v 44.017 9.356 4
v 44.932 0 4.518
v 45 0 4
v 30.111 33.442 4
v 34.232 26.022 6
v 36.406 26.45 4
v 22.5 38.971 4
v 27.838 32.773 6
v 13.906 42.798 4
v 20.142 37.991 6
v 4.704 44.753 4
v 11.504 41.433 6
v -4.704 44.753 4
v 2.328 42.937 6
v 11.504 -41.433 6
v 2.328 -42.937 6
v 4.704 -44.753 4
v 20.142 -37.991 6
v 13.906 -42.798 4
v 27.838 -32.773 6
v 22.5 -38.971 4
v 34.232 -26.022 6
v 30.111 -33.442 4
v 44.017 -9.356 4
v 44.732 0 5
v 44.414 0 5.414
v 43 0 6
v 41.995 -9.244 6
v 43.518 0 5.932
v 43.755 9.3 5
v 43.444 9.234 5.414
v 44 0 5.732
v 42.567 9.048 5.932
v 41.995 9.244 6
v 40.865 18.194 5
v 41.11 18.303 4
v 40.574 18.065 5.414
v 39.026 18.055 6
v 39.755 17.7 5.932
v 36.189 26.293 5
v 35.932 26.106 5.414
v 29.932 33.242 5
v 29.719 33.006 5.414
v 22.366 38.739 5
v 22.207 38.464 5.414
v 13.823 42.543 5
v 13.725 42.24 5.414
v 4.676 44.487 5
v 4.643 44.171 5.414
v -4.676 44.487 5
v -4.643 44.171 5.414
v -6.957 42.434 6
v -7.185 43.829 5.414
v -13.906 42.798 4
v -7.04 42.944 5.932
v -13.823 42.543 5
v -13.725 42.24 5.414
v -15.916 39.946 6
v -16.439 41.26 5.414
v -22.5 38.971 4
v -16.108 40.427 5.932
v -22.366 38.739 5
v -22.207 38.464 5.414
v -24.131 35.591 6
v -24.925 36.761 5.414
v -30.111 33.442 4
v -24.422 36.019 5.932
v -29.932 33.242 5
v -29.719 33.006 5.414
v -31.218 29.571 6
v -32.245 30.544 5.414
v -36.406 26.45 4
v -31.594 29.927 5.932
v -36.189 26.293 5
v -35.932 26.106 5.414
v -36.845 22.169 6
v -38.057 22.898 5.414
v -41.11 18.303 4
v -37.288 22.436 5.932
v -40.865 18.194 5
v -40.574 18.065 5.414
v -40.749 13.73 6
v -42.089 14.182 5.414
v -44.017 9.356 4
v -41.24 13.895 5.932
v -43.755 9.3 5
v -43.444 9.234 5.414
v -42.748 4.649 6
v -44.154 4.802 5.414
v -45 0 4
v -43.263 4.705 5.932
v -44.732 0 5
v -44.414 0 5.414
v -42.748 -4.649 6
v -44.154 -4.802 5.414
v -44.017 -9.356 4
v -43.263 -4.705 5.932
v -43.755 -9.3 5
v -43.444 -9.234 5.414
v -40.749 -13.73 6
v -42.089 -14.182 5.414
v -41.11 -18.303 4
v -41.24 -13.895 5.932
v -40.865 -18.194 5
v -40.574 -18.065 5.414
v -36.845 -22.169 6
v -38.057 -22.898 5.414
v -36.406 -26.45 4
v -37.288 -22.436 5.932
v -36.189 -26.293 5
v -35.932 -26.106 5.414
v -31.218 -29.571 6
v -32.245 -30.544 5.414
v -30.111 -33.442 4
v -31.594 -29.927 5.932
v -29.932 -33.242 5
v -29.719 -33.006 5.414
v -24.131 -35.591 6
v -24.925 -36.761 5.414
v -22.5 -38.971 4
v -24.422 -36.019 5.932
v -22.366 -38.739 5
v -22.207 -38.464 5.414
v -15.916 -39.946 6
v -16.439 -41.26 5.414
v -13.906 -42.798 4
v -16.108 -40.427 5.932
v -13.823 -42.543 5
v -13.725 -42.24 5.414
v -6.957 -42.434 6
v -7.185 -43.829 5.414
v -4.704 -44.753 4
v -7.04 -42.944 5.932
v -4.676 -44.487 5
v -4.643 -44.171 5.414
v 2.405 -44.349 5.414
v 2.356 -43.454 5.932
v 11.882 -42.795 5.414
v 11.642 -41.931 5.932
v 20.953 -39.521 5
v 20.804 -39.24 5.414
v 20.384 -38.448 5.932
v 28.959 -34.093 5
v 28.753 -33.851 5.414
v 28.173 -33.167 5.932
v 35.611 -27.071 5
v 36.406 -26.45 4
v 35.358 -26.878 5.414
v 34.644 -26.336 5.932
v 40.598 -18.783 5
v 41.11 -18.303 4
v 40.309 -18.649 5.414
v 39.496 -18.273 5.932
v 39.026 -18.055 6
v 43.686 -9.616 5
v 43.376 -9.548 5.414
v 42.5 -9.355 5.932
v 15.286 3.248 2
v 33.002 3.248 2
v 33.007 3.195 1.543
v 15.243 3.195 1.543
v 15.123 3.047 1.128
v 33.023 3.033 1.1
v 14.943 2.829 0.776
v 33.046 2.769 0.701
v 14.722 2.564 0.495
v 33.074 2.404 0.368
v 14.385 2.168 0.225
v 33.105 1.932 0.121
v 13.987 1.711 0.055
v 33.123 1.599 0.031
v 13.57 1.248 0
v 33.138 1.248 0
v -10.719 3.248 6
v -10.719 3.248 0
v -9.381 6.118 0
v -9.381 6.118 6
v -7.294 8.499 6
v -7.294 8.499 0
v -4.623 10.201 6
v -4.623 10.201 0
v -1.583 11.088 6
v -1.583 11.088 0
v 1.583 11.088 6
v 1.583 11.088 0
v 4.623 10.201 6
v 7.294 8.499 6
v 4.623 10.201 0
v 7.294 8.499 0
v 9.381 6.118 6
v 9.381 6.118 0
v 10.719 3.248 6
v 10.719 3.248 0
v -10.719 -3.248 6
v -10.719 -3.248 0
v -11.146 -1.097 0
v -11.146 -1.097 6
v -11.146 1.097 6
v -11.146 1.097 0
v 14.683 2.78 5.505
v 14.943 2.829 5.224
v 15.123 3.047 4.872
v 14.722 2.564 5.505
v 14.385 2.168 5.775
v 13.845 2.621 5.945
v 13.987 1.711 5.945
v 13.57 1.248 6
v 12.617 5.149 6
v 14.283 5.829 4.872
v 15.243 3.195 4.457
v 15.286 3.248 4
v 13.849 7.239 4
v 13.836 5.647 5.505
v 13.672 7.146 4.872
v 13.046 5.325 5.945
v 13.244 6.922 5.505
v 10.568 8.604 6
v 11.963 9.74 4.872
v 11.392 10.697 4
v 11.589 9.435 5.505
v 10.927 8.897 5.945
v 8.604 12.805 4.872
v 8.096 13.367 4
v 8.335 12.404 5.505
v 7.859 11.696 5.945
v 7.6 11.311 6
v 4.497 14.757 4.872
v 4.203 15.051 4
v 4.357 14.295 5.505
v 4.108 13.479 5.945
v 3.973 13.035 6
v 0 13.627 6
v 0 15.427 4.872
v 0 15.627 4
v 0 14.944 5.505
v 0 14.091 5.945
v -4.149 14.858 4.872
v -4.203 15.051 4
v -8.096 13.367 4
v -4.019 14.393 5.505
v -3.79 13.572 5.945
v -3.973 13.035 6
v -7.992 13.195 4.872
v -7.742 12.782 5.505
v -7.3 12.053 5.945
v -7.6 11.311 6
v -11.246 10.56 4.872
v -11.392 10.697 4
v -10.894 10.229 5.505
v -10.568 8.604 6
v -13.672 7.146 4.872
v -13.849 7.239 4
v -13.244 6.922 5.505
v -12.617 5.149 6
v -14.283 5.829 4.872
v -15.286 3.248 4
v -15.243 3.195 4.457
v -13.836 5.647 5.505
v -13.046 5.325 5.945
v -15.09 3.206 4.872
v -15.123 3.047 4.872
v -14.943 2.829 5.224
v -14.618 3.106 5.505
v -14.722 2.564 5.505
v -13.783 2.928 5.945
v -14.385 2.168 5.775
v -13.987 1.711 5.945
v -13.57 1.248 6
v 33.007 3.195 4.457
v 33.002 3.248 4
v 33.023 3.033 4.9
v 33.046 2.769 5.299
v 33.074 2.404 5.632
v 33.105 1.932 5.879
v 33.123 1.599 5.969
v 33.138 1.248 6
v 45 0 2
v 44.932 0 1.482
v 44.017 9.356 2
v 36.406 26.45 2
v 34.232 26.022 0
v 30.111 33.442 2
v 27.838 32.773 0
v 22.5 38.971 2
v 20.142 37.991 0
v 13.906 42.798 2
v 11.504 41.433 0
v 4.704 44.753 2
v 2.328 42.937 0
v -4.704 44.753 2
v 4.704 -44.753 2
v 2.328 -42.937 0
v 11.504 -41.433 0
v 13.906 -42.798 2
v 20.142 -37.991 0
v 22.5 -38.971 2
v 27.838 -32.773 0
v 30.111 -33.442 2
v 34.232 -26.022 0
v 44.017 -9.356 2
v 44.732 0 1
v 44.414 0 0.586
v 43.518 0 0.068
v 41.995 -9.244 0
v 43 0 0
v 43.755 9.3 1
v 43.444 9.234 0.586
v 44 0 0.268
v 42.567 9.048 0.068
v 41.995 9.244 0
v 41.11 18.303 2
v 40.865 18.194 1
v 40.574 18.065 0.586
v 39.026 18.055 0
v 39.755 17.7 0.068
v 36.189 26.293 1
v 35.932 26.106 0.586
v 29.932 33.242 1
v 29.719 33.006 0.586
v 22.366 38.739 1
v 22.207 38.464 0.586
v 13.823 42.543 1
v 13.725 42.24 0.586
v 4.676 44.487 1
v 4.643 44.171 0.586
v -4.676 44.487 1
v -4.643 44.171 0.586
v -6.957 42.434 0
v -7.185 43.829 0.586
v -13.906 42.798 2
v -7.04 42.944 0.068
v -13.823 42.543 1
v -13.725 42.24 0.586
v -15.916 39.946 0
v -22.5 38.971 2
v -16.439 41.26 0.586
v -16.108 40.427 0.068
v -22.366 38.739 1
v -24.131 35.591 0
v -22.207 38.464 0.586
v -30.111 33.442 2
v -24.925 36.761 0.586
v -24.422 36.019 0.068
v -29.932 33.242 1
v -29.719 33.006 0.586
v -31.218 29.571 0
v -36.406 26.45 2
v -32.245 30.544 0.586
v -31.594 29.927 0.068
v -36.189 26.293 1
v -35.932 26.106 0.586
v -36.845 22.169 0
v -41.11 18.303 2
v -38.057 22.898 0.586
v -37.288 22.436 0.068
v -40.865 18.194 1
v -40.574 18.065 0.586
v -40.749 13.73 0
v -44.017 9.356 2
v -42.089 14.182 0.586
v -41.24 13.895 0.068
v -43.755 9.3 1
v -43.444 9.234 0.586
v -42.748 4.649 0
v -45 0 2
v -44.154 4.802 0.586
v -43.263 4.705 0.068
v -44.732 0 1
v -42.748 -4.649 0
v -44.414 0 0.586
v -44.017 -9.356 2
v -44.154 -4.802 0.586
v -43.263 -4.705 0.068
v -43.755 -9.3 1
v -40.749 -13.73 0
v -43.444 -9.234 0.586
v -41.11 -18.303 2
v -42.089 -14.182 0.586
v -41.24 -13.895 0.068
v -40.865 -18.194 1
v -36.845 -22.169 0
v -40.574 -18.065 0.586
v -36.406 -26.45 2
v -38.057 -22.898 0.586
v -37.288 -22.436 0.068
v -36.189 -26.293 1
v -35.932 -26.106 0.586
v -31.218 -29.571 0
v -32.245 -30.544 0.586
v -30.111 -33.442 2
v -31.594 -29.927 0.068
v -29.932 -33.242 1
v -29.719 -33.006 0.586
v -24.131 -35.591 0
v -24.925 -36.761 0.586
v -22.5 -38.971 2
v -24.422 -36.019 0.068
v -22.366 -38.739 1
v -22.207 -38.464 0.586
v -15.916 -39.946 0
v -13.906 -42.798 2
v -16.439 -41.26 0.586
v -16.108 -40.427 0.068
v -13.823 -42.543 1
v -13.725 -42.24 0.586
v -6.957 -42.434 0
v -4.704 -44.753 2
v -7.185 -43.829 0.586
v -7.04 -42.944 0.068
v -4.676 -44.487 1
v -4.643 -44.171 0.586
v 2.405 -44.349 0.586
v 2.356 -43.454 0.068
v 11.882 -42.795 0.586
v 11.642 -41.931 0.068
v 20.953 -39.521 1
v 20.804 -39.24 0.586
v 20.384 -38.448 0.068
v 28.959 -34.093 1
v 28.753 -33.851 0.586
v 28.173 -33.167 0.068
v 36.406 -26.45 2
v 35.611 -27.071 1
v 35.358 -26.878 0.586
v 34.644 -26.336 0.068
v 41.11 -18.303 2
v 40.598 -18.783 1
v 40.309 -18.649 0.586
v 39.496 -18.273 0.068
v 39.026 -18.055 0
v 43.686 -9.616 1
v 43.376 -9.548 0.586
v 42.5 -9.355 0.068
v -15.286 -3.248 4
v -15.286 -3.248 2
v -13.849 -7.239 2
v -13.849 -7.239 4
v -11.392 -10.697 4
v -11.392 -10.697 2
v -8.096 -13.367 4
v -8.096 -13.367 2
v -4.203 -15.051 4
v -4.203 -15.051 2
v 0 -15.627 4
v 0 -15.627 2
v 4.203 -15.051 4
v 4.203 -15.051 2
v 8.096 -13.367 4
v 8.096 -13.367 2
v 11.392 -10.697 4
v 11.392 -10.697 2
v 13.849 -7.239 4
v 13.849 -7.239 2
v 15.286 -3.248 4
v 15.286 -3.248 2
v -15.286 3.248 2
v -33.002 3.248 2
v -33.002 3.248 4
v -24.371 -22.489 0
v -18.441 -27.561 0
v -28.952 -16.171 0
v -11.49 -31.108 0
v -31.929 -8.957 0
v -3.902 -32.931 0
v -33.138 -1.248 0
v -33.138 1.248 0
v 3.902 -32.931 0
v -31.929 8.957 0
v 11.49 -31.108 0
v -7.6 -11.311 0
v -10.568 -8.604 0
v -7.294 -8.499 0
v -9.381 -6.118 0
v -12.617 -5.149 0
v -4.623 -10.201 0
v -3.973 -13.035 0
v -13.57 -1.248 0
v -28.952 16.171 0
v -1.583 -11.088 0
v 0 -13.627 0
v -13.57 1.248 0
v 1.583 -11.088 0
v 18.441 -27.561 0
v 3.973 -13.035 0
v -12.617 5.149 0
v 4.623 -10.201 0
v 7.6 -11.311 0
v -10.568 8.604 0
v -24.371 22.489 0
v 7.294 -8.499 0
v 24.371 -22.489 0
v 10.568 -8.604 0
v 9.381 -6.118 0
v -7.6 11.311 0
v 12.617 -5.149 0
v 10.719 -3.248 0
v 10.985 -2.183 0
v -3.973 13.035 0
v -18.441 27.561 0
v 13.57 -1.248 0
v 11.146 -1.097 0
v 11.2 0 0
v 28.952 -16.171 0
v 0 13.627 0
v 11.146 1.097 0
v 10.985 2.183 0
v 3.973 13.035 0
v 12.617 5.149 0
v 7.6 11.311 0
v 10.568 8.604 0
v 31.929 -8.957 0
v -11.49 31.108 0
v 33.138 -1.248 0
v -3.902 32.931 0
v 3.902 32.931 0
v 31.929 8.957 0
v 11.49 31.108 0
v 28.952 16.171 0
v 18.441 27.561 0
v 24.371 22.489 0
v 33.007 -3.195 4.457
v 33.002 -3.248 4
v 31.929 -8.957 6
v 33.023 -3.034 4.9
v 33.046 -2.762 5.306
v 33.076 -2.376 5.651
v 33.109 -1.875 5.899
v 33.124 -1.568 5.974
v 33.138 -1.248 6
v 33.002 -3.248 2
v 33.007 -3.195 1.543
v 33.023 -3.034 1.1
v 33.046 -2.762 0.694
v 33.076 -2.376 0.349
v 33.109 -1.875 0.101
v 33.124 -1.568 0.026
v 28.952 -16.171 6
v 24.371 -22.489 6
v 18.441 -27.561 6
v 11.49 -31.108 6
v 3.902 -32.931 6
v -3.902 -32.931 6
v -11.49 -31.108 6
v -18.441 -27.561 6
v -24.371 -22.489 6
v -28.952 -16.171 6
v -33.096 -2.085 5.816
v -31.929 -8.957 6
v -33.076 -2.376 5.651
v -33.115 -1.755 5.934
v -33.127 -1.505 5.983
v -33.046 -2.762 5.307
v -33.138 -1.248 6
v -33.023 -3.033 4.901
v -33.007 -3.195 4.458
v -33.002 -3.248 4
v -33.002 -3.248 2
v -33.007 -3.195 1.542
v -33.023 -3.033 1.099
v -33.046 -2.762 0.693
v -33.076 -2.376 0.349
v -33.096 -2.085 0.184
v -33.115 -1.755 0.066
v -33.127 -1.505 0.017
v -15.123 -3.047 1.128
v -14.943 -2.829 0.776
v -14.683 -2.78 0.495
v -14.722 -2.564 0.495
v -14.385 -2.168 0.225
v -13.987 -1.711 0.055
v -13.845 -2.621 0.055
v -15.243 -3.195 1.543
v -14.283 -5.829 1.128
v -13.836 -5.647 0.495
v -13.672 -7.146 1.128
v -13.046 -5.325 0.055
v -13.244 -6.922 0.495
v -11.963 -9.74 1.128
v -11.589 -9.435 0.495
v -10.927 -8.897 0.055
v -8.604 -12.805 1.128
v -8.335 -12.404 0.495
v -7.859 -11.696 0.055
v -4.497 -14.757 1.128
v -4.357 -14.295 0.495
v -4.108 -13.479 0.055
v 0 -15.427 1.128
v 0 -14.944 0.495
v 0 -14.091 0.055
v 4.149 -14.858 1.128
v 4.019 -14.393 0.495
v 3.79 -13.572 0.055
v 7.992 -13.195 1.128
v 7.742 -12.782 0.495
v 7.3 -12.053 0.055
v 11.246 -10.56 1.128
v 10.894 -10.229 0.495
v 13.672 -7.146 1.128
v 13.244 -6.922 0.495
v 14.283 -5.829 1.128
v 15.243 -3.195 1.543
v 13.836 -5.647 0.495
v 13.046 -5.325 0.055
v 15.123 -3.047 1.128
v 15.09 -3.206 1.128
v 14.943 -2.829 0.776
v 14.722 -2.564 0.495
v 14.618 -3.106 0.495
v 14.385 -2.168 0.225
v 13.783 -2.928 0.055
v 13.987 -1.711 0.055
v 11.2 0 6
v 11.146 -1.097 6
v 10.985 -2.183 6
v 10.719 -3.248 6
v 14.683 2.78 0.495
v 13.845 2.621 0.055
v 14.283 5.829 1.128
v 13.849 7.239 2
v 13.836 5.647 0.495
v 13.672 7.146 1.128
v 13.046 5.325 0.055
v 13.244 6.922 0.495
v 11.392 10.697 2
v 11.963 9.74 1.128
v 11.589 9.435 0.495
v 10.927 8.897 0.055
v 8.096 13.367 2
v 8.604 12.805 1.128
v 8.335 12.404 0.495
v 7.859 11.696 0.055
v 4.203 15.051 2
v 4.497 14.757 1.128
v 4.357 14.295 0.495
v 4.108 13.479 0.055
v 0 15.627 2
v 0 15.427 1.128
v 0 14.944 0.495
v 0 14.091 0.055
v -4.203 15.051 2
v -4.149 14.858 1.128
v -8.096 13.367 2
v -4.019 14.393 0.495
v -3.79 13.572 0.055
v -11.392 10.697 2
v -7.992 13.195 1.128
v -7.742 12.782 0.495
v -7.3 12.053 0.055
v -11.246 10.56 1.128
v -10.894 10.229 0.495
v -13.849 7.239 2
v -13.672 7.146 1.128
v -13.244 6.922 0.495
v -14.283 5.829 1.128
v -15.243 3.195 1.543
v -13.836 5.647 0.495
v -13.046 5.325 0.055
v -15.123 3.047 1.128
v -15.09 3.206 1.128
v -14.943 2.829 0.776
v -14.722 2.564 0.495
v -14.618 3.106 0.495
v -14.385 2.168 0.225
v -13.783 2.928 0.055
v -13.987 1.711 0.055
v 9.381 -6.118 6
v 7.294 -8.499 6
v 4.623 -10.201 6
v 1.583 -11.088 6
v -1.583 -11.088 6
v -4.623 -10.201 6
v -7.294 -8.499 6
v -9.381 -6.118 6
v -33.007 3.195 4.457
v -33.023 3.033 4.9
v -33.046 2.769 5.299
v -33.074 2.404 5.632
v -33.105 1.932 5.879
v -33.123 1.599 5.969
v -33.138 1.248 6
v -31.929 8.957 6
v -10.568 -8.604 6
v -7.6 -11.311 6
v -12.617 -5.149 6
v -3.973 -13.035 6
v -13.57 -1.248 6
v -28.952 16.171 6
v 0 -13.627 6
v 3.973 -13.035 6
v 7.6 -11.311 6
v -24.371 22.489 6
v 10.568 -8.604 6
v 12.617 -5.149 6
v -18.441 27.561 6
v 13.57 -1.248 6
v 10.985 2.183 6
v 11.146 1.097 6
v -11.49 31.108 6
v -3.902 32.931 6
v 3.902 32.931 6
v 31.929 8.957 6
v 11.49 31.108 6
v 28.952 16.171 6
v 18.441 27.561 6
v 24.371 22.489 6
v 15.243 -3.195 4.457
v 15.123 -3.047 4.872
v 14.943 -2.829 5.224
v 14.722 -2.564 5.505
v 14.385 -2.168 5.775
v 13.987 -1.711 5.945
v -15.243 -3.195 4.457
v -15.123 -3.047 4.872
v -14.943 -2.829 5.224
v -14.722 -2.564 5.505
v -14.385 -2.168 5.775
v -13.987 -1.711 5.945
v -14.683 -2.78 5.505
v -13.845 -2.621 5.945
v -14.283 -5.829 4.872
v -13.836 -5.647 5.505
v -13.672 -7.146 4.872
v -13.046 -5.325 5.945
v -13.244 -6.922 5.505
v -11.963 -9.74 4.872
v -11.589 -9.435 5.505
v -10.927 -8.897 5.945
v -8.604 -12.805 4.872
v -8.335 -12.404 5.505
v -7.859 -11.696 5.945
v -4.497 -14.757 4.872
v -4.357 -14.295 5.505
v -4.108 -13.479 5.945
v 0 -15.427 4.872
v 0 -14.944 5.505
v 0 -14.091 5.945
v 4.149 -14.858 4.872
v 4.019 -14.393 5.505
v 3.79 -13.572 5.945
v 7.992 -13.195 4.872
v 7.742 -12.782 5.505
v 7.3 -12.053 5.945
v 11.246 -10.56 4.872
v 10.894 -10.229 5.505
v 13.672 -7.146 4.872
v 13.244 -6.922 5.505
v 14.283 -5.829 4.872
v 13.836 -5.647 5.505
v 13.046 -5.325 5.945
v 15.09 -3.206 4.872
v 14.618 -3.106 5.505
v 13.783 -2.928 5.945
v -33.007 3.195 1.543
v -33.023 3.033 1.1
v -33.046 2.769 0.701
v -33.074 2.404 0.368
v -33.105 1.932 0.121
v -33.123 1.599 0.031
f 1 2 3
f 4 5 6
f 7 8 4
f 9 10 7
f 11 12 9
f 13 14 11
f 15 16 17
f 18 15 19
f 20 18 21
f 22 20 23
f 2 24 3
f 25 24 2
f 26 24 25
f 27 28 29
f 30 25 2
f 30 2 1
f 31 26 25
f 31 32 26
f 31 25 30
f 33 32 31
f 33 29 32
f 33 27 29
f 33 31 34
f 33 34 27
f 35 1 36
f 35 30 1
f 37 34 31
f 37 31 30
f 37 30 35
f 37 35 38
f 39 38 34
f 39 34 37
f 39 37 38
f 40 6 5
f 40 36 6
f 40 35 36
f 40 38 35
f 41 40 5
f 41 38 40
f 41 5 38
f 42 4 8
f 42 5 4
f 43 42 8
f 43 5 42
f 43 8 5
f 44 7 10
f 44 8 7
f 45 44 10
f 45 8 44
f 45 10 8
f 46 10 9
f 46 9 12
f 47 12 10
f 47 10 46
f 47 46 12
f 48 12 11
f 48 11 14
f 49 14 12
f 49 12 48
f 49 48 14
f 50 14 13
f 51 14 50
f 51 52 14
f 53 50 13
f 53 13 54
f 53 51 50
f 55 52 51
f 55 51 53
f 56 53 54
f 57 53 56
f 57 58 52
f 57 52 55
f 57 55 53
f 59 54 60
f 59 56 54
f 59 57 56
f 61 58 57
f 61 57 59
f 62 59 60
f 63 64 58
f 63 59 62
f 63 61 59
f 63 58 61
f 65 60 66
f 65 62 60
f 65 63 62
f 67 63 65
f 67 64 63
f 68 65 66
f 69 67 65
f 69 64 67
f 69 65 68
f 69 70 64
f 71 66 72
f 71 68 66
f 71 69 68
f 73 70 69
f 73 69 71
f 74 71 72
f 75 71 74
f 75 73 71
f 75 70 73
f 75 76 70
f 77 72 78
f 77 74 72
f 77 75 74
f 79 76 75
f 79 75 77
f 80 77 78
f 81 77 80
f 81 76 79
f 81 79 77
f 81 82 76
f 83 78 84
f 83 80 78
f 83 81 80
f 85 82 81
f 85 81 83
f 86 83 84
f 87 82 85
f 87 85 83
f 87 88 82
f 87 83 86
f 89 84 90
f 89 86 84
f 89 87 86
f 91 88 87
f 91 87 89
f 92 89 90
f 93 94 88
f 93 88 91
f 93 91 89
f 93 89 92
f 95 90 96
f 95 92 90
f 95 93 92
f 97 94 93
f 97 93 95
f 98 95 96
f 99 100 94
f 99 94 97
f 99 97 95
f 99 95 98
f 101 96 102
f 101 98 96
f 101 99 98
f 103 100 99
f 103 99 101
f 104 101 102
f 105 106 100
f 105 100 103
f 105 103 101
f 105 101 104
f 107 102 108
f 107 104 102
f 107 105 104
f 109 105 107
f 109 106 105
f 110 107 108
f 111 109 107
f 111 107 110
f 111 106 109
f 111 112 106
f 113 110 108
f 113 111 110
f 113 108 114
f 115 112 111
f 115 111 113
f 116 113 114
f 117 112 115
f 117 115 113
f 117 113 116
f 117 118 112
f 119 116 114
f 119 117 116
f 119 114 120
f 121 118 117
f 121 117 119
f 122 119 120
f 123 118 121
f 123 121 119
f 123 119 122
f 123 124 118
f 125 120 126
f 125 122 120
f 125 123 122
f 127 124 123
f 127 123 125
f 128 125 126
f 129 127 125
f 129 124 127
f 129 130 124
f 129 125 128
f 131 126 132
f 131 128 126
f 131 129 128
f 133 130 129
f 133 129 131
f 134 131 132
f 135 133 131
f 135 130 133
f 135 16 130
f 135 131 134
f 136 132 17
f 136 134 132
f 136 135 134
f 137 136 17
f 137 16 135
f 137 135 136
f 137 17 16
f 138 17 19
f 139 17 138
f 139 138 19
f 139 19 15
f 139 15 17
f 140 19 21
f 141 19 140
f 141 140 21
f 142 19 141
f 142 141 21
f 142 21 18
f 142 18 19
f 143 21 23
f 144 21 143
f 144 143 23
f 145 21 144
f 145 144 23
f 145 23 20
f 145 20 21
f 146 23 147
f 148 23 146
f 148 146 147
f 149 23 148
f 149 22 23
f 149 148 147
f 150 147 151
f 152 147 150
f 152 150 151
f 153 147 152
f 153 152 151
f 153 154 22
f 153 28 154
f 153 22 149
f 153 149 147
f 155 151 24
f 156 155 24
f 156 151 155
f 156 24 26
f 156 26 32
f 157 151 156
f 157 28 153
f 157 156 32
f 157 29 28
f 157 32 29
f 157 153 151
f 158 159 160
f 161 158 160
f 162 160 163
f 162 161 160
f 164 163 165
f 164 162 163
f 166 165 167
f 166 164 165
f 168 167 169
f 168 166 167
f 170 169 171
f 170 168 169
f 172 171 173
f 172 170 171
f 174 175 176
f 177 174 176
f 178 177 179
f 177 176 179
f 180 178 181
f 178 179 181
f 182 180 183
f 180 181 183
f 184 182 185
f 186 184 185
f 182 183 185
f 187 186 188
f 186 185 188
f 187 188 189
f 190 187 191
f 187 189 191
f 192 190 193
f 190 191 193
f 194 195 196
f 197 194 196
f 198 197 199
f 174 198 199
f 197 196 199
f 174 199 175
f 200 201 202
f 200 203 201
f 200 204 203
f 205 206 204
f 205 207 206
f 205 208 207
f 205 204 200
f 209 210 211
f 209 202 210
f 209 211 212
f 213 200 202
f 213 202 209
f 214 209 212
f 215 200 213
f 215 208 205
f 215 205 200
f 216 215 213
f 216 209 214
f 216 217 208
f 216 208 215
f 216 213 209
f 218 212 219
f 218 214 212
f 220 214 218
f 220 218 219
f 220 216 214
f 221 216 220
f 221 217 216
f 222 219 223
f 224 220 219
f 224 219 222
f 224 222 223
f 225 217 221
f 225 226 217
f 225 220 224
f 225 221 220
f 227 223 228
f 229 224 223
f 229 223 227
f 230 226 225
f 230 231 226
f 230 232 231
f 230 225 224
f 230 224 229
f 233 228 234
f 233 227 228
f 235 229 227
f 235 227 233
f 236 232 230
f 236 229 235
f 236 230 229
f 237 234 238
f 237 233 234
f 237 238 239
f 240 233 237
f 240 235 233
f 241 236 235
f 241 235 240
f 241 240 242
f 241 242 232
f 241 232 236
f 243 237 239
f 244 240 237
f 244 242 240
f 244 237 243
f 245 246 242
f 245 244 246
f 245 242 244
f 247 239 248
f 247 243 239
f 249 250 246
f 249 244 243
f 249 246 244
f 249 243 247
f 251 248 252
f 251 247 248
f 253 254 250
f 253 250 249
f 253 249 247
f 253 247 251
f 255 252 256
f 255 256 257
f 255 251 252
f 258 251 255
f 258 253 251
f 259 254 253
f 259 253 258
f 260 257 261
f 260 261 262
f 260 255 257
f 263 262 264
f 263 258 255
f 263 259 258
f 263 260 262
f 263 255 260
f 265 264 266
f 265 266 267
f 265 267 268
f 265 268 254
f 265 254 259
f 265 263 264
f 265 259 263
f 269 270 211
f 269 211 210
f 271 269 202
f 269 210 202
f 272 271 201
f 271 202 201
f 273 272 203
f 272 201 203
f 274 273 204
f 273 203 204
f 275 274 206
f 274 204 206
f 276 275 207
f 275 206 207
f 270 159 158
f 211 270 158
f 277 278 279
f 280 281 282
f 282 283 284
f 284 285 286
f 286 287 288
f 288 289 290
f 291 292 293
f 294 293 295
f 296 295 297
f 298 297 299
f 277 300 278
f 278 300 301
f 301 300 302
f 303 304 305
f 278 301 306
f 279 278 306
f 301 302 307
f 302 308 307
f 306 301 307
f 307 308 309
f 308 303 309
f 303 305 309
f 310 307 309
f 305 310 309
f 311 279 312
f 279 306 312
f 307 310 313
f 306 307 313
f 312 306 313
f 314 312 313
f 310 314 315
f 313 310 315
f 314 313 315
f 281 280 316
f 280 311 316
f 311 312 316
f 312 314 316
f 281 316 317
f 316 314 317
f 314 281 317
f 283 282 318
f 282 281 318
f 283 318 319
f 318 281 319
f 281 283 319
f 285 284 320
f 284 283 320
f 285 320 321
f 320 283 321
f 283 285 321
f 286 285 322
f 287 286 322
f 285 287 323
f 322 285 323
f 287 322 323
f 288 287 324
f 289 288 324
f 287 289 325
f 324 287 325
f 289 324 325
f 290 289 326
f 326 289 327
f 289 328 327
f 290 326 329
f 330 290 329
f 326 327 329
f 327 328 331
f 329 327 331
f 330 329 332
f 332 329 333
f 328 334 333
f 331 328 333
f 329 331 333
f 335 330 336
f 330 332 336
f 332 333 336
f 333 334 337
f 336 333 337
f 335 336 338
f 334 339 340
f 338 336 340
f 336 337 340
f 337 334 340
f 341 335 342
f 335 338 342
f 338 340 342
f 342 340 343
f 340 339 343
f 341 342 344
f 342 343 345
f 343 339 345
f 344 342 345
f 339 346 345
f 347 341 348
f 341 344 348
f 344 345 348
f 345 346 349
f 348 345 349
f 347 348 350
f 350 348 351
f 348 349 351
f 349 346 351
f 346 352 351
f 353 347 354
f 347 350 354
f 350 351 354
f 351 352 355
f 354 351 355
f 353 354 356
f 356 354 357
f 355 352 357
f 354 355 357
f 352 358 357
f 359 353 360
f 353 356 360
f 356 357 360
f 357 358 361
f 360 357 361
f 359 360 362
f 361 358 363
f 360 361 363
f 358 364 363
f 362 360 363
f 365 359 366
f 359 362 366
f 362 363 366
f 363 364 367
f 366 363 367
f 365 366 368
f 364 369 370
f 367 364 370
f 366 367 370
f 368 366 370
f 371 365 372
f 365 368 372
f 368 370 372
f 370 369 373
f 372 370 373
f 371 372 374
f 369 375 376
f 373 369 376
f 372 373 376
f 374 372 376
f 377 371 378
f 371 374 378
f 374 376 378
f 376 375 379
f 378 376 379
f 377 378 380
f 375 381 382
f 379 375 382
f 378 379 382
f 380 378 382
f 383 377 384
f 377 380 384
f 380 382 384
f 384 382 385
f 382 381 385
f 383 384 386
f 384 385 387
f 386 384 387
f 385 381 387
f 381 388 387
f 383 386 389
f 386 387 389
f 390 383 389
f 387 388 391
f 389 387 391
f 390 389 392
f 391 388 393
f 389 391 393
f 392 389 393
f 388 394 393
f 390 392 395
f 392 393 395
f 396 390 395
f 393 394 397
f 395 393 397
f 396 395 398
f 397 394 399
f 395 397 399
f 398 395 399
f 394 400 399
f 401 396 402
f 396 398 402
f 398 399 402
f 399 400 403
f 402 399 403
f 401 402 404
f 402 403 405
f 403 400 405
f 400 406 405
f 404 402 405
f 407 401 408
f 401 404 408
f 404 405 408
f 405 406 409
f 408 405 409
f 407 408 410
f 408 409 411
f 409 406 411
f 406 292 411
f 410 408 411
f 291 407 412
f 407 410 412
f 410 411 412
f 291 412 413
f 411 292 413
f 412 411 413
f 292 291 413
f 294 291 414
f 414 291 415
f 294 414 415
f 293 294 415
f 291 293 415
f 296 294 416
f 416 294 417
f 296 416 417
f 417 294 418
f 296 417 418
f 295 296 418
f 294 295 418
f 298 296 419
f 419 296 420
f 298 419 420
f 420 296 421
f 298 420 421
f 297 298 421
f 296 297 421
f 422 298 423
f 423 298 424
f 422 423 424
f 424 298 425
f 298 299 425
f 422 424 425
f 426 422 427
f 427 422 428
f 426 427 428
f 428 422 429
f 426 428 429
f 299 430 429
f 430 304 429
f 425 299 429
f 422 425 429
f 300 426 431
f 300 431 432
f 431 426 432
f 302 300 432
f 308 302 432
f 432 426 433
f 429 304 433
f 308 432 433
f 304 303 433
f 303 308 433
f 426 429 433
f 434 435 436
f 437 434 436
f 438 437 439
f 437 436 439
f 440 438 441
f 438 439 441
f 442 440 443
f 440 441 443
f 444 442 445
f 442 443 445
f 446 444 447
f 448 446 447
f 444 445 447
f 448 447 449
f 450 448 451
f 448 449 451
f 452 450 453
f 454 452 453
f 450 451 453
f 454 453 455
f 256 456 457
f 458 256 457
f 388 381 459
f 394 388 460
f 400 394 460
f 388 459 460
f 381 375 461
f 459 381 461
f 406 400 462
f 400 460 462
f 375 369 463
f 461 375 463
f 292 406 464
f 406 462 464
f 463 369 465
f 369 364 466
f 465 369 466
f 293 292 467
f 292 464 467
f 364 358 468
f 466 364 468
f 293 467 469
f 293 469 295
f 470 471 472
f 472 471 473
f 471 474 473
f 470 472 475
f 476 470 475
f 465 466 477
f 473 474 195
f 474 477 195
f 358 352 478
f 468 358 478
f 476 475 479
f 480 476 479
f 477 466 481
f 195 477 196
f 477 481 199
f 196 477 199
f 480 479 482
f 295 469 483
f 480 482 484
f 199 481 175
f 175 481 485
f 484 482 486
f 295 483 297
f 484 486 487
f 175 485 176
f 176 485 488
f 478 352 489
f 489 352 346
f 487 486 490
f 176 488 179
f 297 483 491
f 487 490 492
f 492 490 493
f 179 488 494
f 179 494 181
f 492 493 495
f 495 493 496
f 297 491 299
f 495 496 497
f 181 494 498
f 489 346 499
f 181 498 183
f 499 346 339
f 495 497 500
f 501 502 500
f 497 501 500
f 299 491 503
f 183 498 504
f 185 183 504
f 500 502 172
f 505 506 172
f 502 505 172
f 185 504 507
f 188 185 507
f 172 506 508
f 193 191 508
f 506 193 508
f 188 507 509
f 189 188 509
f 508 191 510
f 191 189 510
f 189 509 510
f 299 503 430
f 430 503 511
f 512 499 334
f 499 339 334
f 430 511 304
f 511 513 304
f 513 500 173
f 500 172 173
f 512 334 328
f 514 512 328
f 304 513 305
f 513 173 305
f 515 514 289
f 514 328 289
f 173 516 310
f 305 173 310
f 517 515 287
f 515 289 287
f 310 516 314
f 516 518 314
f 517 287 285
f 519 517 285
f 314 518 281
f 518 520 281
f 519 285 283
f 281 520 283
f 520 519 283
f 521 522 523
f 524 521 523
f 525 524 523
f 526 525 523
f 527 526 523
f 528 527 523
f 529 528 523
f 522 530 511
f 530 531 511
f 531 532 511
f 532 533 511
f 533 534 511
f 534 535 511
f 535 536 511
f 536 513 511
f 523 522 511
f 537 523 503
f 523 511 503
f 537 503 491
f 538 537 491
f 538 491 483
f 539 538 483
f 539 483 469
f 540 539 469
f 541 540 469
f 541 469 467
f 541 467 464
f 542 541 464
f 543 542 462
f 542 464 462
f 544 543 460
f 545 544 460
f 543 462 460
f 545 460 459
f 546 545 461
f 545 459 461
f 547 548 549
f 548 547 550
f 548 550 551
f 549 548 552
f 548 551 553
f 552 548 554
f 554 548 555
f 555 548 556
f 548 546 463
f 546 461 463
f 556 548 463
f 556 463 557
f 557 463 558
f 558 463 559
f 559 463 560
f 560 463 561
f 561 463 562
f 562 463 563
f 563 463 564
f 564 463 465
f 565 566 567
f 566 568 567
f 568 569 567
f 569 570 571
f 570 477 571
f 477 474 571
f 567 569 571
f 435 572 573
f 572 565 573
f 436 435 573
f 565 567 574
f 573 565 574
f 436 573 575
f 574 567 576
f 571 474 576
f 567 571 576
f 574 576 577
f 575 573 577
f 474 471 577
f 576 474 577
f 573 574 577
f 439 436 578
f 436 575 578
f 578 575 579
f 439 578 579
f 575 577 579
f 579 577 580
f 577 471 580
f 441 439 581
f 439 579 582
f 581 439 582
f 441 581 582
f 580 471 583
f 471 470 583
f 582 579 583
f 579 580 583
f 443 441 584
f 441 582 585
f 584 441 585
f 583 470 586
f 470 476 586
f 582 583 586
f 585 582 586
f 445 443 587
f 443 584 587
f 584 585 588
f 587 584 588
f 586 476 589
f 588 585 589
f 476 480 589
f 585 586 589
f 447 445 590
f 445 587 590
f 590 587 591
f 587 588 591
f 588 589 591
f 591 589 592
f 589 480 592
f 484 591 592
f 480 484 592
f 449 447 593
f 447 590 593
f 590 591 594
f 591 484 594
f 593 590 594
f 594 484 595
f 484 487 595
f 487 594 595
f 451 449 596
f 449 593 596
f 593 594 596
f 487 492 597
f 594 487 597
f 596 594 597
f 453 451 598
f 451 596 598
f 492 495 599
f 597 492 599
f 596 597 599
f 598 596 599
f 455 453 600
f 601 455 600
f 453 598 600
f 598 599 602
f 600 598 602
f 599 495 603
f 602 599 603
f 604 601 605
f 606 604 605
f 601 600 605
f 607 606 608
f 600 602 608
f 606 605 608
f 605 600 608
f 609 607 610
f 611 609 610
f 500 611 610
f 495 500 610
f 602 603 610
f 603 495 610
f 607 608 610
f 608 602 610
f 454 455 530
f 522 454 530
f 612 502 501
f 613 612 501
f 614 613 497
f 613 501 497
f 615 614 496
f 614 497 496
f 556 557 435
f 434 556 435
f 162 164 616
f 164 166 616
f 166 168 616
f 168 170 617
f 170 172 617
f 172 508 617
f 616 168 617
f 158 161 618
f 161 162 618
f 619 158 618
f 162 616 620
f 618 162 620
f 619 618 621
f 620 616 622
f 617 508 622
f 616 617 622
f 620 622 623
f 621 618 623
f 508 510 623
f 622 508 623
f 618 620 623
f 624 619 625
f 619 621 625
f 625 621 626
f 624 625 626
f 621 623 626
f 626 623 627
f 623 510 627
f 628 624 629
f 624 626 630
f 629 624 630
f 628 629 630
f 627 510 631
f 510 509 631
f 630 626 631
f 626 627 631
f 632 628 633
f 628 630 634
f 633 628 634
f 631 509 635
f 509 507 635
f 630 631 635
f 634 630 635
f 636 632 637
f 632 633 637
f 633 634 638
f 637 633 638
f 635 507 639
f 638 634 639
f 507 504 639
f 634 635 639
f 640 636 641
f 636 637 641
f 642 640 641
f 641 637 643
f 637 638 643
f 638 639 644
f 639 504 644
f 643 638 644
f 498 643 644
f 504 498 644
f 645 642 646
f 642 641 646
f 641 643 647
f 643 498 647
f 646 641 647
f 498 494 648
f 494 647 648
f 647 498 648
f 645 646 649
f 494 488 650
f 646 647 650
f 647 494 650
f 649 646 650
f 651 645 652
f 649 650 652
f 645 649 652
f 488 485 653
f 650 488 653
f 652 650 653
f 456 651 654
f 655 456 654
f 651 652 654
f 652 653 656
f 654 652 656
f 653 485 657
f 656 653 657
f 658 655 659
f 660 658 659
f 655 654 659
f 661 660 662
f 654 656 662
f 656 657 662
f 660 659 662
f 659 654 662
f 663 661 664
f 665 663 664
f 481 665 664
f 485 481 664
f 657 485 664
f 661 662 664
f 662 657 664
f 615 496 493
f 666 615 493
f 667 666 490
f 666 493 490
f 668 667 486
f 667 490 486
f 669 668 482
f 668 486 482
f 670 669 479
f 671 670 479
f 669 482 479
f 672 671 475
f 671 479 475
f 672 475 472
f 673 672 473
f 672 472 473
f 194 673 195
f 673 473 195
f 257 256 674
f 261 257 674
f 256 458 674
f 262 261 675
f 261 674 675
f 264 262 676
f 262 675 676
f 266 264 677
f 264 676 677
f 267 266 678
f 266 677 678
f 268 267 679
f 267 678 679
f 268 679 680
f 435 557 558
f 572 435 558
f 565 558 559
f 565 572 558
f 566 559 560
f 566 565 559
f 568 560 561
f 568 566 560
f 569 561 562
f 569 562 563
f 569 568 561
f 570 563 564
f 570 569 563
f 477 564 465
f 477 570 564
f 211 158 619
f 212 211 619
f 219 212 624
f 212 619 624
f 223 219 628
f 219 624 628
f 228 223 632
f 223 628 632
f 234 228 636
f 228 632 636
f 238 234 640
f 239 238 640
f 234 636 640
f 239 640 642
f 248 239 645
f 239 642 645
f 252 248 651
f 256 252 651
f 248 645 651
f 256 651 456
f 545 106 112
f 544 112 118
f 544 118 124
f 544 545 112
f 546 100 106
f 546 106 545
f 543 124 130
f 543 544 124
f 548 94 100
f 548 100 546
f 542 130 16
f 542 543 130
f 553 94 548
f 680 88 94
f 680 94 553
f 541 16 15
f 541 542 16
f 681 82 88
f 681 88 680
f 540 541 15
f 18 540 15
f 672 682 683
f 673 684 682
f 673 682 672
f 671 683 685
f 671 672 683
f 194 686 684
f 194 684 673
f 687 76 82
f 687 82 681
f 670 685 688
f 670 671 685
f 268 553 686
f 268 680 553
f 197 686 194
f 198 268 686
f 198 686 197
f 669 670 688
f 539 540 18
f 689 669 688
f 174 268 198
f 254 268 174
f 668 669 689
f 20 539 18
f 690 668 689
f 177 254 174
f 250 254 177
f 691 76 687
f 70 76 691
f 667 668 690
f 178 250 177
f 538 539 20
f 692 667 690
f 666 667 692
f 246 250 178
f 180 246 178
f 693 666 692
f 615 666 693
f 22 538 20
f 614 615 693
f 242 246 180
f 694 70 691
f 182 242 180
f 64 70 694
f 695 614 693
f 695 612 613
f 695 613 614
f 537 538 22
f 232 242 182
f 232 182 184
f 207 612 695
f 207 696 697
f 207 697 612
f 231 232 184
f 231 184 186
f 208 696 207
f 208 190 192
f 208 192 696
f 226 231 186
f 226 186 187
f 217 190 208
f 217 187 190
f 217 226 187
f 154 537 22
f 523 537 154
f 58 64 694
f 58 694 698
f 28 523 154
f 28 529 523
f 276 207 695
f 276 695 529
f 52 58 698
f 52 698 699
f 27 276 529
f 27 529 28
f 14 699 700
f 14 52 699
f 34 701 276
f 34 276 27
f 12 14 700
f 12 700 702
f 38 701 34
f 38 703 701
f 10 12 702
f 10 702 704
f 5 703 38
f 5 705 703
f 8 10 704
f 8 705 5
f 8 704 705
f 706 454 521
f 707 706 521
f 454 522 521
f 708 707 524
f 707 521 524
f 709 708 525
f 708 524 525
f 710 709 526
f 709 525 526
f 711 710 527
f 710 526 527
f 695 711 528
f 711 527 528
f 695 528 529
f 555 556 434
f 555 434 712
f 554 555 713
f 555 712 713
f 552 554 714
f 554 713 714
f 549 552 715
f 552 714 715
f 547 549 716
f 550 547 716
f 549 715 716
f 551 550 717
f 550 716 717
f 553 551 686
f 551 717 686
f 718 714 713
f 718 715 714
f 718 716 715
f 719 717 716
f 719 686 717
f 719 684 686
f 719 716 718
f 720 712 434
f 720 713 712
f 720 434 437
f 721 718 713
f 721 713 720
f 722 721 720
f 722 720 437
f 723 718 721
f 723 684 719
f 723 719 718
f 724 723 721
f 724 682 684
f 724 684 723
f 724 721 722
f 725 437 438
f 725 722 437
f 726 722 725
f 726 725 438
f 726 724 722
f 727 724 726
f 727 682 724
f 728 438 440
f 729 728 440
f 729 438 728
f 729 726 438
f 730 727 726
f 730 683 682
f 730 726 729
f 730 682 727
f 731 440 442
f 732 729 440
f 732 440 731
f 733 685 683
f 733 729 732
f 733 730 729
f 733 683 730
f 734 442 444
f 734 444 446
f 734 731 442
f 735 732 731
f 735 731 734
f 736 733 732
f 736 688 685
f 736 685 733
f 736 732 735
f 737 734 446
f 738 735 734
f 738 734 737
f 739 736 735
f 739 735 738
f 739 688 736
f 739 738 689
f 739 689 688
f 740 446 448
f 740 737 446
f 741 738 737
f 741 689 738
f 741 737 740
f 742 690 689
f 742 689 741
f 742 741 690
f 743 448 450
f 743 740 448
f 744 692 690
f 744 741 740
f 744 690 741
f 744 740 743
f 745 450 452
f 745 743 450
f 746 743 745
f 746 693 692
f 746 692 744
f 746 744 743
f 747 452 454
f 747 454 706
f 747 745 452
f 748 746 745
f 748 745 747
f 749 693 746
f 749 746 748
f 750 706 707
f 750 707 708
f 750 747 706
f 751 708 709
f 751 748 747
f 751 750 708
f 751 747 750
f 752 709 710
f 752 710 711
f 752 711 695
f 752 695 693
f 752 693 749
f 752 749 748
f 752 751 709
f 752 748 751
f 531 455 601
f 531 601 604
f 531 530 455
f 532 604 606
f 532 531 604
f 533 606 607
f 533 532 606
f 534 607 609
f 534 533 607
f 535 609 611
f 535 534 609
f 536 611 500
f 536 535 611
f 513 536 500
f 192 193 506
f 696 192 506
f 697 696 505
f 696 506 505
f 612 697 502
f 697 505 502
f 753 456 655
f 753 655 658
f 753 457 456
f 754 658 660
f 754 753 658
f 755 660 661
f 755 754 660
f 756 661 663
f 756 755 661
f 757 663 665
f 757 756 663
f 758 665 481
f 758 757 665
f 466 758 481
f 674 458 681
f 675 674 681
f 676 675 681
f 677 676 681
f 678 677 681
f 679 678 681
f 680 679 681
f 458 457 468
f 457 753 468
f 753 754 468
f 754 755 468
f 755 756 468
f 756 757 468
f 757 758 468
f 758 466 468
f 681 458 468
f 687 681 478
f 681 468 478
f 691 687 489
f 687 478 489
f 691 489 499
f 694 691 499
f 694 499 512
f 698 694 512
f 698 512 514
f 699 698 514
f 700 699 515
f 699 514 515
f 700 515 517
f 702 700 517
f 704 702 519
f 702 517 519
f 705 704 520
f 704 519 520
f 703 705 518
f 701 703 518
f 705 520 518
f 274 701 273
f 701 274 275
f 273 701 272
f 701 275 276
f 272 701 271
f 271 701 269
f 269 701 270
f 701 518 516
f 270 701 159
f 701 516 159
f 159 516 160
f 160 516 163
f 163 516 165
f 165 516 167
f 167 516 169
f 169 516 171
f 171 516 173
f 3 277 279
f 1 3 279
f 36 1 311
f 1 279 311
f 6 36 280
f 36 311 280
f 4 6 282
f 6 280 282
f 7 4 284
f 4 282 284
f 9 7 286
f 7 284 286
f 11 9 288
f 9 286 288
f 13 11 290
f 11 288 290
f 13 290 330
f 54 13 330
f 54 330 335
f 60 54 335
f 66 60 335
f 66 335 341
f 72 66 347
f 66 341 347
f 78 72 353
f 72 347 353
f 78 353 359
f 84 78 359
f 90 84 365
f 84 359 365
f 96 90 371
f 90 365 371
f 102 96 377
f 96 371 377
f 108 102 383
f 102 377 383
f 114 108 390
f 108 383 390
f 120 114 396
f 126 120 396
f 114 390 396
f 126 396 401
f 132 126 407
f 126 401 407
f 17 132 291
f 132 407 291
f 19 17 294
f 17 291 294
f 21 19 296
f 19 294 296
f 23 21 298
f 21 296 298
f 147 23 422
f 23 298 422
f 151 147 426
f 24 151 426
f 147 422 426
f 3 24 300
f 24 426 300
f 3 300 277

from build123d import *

# Parameters (mm, degrees)
F0_R     = 45
F1_DEPTH = 6
F2_R     = 2


with BuildPart() as f1:
    # F0 (on Top) → F1 (new body)
    with BuildSketch(Plane.XY):
        Circle(F0_R)
        with BuildLine():
            ThreePointArc((33.0021725985, 3.2475610053), (33.1217003385, 1.6257353391), (33.1615748828, 0))
            ThreePointArc((33.1615748828, 0), (33.1217003385, -1.6257353391), (33.0021725985, -3.2475610053))
            ThreePointArc((33.0021725985, -3.2475610053), (0, -33.1615748828), (-33.0021725985, -3.2475610053))
            ThreePointArc((-33.0021725985, -3.2475610053), (-33.1615748828, 0), (-33.0021725985, 3.2475610053))
            ThreePointArc((-33.0021725985, 3.2475610053), (0, 33.1615748828), (33.0021725985, 3.2475610053))
        make_face(mode=Mode.SUBTRACT)
        with BuildLine():
            Line((-15.2860053166, 3.2475610053), (-33.0021725985, 3.2475610053))
            ThreePointArc((-33.0021725985, 3.2475610053), (-33.1615748828, 0), (-33.0021725985, -3.2475610053))
            Line((-33.0021725985, -3.2475610053), (-15.2860053166, -3.2475610053))
            ThreePointArc((-15.2860053166, -3.2475610053), (-15.6271754013, 0), (-15.2860053166, 3.2475610053))
        make_face()
        with BuildLine():
            Line((-10.7188314436, 3.2475610053), (-15.2860053166, 3.2475610053))
            ThreePointArc((-15.2860053166, 3.2475610053), (-15.6271754013, 0), (-15.2860053166, -3.2475610053))
            Line((-15.2860053166, -3.2475610053), (-10.7188314436, -3.2475610053))
            ThreePointArc((-10.7188314436, -3.2475610053), (-11.2, 0), (-10.7188314436, 3.2475610053))
        make_face()
        with BuildLine():
            Line((10.7188314436, 3.2475610053), (15.2860053166, 3.2475610053))
            ThreePointArc((15.2860053166, 3.2475610053), (0, 15.6271754013), (-15.2860053166, 3.2475610053))
            Line((-15.2860053166, 3.2475610053), (-10.7188314436, 3.2475610053))
            ThreePointArc((-10.7188314436, 3.2475610053), (0, 11.2), (10.7188314436, 3.2475610053))
        make_face()
        with BuildLine():
            ThreePointArc((-15.2860053166, -3.2475610053), (0, -15.6271754013), (15.2860053166, -3.2475610053))
            Line((15.2860053166, -3.2475610053), (10.7188314436, -3.2475610053))
            ThreePointArc((10.7188314436, -3.2475610053), (0, -11.2), (-10.7188314436, -3.2475610053))
            Line((-10.7188314436, -3.2475610053), (-15.2860053166, -3.2475610053))
        make_face()
        with BuildLine():
            ThreePointArc((15.6271754013, 0), (15.5416488393, 1.6327162575), (15.2860053166, 3.2475610053))
            Line((15.2860053166, 3.2475610053), (10.7188314436, 3.2475610053))
            ThreePointArc((10.7188314436, 3.2475610053), (11.0790548371, 1.6415065993), (11.2, 0))
            ThreePointArc((11.2, 0), (11.0790548371, -1.6415065993), (10.7188314436, -3.2475610053))
            Line((10.7188314436, -3.2475610053), (15.2860053166, -3.2475610053))
            ThreePointArc((15.2860053166, -3.2475610053), (15.5416488393, -1.6327162575), (15.6271754013, 0))
        make_face()
        with BuildLine():
            ThreePointArc((33.0021725985, -3.2475610053), (33.1217003385, -1.6257353391), (33.1615748828, 0))
            ThreePointArc((33.1615748828, 0), (33.1217003385, 1.6257353391), (33.0021725985, 3.2475610053))
            Line((33.0021725985, 3.2475610053), (15.2860053166, 3.2475610053))
            ThreePointArc((15.2860053166, 3.2475610053), (15.5416488393, 1.6327162575), (15.6271754013, 0))
            ThreePointArc((15.6271754013, 0), (15.5416488393, -1.6327162575), (15.2860053166, -3.2475610053))
            Line((15.2860053166, -3.2475610053), (33.0021725985, -3.2475610053))
        make_face()
    extrude(amount=F1_DEPTH)

    # F2
    f2_edges = [f1.edges().sort_by_distance(p)[0] for p in [
        (-45, 0, 6),
        (-24.144089, -3.247561, 6),
        (0, -15.627175, 0),
        (24.144089, -3.247561, 6),
        (0, 15.627175, 6),
        (-24.144089, 3.247561, 6),
        (24.144089, 3.247561, 6),
        (-45, 0, 0),
        (0, 15.627175, 0),
        (24.144089, 3.247561, 0),
        (0, -15.627175, 6),
        (-24.144089, 3.247561, 0),
        (-24.144089, -3.247561, 0),
        (24.144089, -3.247561, 0),
    ]]
    fillet(f2_edges, radius=F2_R)


solid = f1.part
